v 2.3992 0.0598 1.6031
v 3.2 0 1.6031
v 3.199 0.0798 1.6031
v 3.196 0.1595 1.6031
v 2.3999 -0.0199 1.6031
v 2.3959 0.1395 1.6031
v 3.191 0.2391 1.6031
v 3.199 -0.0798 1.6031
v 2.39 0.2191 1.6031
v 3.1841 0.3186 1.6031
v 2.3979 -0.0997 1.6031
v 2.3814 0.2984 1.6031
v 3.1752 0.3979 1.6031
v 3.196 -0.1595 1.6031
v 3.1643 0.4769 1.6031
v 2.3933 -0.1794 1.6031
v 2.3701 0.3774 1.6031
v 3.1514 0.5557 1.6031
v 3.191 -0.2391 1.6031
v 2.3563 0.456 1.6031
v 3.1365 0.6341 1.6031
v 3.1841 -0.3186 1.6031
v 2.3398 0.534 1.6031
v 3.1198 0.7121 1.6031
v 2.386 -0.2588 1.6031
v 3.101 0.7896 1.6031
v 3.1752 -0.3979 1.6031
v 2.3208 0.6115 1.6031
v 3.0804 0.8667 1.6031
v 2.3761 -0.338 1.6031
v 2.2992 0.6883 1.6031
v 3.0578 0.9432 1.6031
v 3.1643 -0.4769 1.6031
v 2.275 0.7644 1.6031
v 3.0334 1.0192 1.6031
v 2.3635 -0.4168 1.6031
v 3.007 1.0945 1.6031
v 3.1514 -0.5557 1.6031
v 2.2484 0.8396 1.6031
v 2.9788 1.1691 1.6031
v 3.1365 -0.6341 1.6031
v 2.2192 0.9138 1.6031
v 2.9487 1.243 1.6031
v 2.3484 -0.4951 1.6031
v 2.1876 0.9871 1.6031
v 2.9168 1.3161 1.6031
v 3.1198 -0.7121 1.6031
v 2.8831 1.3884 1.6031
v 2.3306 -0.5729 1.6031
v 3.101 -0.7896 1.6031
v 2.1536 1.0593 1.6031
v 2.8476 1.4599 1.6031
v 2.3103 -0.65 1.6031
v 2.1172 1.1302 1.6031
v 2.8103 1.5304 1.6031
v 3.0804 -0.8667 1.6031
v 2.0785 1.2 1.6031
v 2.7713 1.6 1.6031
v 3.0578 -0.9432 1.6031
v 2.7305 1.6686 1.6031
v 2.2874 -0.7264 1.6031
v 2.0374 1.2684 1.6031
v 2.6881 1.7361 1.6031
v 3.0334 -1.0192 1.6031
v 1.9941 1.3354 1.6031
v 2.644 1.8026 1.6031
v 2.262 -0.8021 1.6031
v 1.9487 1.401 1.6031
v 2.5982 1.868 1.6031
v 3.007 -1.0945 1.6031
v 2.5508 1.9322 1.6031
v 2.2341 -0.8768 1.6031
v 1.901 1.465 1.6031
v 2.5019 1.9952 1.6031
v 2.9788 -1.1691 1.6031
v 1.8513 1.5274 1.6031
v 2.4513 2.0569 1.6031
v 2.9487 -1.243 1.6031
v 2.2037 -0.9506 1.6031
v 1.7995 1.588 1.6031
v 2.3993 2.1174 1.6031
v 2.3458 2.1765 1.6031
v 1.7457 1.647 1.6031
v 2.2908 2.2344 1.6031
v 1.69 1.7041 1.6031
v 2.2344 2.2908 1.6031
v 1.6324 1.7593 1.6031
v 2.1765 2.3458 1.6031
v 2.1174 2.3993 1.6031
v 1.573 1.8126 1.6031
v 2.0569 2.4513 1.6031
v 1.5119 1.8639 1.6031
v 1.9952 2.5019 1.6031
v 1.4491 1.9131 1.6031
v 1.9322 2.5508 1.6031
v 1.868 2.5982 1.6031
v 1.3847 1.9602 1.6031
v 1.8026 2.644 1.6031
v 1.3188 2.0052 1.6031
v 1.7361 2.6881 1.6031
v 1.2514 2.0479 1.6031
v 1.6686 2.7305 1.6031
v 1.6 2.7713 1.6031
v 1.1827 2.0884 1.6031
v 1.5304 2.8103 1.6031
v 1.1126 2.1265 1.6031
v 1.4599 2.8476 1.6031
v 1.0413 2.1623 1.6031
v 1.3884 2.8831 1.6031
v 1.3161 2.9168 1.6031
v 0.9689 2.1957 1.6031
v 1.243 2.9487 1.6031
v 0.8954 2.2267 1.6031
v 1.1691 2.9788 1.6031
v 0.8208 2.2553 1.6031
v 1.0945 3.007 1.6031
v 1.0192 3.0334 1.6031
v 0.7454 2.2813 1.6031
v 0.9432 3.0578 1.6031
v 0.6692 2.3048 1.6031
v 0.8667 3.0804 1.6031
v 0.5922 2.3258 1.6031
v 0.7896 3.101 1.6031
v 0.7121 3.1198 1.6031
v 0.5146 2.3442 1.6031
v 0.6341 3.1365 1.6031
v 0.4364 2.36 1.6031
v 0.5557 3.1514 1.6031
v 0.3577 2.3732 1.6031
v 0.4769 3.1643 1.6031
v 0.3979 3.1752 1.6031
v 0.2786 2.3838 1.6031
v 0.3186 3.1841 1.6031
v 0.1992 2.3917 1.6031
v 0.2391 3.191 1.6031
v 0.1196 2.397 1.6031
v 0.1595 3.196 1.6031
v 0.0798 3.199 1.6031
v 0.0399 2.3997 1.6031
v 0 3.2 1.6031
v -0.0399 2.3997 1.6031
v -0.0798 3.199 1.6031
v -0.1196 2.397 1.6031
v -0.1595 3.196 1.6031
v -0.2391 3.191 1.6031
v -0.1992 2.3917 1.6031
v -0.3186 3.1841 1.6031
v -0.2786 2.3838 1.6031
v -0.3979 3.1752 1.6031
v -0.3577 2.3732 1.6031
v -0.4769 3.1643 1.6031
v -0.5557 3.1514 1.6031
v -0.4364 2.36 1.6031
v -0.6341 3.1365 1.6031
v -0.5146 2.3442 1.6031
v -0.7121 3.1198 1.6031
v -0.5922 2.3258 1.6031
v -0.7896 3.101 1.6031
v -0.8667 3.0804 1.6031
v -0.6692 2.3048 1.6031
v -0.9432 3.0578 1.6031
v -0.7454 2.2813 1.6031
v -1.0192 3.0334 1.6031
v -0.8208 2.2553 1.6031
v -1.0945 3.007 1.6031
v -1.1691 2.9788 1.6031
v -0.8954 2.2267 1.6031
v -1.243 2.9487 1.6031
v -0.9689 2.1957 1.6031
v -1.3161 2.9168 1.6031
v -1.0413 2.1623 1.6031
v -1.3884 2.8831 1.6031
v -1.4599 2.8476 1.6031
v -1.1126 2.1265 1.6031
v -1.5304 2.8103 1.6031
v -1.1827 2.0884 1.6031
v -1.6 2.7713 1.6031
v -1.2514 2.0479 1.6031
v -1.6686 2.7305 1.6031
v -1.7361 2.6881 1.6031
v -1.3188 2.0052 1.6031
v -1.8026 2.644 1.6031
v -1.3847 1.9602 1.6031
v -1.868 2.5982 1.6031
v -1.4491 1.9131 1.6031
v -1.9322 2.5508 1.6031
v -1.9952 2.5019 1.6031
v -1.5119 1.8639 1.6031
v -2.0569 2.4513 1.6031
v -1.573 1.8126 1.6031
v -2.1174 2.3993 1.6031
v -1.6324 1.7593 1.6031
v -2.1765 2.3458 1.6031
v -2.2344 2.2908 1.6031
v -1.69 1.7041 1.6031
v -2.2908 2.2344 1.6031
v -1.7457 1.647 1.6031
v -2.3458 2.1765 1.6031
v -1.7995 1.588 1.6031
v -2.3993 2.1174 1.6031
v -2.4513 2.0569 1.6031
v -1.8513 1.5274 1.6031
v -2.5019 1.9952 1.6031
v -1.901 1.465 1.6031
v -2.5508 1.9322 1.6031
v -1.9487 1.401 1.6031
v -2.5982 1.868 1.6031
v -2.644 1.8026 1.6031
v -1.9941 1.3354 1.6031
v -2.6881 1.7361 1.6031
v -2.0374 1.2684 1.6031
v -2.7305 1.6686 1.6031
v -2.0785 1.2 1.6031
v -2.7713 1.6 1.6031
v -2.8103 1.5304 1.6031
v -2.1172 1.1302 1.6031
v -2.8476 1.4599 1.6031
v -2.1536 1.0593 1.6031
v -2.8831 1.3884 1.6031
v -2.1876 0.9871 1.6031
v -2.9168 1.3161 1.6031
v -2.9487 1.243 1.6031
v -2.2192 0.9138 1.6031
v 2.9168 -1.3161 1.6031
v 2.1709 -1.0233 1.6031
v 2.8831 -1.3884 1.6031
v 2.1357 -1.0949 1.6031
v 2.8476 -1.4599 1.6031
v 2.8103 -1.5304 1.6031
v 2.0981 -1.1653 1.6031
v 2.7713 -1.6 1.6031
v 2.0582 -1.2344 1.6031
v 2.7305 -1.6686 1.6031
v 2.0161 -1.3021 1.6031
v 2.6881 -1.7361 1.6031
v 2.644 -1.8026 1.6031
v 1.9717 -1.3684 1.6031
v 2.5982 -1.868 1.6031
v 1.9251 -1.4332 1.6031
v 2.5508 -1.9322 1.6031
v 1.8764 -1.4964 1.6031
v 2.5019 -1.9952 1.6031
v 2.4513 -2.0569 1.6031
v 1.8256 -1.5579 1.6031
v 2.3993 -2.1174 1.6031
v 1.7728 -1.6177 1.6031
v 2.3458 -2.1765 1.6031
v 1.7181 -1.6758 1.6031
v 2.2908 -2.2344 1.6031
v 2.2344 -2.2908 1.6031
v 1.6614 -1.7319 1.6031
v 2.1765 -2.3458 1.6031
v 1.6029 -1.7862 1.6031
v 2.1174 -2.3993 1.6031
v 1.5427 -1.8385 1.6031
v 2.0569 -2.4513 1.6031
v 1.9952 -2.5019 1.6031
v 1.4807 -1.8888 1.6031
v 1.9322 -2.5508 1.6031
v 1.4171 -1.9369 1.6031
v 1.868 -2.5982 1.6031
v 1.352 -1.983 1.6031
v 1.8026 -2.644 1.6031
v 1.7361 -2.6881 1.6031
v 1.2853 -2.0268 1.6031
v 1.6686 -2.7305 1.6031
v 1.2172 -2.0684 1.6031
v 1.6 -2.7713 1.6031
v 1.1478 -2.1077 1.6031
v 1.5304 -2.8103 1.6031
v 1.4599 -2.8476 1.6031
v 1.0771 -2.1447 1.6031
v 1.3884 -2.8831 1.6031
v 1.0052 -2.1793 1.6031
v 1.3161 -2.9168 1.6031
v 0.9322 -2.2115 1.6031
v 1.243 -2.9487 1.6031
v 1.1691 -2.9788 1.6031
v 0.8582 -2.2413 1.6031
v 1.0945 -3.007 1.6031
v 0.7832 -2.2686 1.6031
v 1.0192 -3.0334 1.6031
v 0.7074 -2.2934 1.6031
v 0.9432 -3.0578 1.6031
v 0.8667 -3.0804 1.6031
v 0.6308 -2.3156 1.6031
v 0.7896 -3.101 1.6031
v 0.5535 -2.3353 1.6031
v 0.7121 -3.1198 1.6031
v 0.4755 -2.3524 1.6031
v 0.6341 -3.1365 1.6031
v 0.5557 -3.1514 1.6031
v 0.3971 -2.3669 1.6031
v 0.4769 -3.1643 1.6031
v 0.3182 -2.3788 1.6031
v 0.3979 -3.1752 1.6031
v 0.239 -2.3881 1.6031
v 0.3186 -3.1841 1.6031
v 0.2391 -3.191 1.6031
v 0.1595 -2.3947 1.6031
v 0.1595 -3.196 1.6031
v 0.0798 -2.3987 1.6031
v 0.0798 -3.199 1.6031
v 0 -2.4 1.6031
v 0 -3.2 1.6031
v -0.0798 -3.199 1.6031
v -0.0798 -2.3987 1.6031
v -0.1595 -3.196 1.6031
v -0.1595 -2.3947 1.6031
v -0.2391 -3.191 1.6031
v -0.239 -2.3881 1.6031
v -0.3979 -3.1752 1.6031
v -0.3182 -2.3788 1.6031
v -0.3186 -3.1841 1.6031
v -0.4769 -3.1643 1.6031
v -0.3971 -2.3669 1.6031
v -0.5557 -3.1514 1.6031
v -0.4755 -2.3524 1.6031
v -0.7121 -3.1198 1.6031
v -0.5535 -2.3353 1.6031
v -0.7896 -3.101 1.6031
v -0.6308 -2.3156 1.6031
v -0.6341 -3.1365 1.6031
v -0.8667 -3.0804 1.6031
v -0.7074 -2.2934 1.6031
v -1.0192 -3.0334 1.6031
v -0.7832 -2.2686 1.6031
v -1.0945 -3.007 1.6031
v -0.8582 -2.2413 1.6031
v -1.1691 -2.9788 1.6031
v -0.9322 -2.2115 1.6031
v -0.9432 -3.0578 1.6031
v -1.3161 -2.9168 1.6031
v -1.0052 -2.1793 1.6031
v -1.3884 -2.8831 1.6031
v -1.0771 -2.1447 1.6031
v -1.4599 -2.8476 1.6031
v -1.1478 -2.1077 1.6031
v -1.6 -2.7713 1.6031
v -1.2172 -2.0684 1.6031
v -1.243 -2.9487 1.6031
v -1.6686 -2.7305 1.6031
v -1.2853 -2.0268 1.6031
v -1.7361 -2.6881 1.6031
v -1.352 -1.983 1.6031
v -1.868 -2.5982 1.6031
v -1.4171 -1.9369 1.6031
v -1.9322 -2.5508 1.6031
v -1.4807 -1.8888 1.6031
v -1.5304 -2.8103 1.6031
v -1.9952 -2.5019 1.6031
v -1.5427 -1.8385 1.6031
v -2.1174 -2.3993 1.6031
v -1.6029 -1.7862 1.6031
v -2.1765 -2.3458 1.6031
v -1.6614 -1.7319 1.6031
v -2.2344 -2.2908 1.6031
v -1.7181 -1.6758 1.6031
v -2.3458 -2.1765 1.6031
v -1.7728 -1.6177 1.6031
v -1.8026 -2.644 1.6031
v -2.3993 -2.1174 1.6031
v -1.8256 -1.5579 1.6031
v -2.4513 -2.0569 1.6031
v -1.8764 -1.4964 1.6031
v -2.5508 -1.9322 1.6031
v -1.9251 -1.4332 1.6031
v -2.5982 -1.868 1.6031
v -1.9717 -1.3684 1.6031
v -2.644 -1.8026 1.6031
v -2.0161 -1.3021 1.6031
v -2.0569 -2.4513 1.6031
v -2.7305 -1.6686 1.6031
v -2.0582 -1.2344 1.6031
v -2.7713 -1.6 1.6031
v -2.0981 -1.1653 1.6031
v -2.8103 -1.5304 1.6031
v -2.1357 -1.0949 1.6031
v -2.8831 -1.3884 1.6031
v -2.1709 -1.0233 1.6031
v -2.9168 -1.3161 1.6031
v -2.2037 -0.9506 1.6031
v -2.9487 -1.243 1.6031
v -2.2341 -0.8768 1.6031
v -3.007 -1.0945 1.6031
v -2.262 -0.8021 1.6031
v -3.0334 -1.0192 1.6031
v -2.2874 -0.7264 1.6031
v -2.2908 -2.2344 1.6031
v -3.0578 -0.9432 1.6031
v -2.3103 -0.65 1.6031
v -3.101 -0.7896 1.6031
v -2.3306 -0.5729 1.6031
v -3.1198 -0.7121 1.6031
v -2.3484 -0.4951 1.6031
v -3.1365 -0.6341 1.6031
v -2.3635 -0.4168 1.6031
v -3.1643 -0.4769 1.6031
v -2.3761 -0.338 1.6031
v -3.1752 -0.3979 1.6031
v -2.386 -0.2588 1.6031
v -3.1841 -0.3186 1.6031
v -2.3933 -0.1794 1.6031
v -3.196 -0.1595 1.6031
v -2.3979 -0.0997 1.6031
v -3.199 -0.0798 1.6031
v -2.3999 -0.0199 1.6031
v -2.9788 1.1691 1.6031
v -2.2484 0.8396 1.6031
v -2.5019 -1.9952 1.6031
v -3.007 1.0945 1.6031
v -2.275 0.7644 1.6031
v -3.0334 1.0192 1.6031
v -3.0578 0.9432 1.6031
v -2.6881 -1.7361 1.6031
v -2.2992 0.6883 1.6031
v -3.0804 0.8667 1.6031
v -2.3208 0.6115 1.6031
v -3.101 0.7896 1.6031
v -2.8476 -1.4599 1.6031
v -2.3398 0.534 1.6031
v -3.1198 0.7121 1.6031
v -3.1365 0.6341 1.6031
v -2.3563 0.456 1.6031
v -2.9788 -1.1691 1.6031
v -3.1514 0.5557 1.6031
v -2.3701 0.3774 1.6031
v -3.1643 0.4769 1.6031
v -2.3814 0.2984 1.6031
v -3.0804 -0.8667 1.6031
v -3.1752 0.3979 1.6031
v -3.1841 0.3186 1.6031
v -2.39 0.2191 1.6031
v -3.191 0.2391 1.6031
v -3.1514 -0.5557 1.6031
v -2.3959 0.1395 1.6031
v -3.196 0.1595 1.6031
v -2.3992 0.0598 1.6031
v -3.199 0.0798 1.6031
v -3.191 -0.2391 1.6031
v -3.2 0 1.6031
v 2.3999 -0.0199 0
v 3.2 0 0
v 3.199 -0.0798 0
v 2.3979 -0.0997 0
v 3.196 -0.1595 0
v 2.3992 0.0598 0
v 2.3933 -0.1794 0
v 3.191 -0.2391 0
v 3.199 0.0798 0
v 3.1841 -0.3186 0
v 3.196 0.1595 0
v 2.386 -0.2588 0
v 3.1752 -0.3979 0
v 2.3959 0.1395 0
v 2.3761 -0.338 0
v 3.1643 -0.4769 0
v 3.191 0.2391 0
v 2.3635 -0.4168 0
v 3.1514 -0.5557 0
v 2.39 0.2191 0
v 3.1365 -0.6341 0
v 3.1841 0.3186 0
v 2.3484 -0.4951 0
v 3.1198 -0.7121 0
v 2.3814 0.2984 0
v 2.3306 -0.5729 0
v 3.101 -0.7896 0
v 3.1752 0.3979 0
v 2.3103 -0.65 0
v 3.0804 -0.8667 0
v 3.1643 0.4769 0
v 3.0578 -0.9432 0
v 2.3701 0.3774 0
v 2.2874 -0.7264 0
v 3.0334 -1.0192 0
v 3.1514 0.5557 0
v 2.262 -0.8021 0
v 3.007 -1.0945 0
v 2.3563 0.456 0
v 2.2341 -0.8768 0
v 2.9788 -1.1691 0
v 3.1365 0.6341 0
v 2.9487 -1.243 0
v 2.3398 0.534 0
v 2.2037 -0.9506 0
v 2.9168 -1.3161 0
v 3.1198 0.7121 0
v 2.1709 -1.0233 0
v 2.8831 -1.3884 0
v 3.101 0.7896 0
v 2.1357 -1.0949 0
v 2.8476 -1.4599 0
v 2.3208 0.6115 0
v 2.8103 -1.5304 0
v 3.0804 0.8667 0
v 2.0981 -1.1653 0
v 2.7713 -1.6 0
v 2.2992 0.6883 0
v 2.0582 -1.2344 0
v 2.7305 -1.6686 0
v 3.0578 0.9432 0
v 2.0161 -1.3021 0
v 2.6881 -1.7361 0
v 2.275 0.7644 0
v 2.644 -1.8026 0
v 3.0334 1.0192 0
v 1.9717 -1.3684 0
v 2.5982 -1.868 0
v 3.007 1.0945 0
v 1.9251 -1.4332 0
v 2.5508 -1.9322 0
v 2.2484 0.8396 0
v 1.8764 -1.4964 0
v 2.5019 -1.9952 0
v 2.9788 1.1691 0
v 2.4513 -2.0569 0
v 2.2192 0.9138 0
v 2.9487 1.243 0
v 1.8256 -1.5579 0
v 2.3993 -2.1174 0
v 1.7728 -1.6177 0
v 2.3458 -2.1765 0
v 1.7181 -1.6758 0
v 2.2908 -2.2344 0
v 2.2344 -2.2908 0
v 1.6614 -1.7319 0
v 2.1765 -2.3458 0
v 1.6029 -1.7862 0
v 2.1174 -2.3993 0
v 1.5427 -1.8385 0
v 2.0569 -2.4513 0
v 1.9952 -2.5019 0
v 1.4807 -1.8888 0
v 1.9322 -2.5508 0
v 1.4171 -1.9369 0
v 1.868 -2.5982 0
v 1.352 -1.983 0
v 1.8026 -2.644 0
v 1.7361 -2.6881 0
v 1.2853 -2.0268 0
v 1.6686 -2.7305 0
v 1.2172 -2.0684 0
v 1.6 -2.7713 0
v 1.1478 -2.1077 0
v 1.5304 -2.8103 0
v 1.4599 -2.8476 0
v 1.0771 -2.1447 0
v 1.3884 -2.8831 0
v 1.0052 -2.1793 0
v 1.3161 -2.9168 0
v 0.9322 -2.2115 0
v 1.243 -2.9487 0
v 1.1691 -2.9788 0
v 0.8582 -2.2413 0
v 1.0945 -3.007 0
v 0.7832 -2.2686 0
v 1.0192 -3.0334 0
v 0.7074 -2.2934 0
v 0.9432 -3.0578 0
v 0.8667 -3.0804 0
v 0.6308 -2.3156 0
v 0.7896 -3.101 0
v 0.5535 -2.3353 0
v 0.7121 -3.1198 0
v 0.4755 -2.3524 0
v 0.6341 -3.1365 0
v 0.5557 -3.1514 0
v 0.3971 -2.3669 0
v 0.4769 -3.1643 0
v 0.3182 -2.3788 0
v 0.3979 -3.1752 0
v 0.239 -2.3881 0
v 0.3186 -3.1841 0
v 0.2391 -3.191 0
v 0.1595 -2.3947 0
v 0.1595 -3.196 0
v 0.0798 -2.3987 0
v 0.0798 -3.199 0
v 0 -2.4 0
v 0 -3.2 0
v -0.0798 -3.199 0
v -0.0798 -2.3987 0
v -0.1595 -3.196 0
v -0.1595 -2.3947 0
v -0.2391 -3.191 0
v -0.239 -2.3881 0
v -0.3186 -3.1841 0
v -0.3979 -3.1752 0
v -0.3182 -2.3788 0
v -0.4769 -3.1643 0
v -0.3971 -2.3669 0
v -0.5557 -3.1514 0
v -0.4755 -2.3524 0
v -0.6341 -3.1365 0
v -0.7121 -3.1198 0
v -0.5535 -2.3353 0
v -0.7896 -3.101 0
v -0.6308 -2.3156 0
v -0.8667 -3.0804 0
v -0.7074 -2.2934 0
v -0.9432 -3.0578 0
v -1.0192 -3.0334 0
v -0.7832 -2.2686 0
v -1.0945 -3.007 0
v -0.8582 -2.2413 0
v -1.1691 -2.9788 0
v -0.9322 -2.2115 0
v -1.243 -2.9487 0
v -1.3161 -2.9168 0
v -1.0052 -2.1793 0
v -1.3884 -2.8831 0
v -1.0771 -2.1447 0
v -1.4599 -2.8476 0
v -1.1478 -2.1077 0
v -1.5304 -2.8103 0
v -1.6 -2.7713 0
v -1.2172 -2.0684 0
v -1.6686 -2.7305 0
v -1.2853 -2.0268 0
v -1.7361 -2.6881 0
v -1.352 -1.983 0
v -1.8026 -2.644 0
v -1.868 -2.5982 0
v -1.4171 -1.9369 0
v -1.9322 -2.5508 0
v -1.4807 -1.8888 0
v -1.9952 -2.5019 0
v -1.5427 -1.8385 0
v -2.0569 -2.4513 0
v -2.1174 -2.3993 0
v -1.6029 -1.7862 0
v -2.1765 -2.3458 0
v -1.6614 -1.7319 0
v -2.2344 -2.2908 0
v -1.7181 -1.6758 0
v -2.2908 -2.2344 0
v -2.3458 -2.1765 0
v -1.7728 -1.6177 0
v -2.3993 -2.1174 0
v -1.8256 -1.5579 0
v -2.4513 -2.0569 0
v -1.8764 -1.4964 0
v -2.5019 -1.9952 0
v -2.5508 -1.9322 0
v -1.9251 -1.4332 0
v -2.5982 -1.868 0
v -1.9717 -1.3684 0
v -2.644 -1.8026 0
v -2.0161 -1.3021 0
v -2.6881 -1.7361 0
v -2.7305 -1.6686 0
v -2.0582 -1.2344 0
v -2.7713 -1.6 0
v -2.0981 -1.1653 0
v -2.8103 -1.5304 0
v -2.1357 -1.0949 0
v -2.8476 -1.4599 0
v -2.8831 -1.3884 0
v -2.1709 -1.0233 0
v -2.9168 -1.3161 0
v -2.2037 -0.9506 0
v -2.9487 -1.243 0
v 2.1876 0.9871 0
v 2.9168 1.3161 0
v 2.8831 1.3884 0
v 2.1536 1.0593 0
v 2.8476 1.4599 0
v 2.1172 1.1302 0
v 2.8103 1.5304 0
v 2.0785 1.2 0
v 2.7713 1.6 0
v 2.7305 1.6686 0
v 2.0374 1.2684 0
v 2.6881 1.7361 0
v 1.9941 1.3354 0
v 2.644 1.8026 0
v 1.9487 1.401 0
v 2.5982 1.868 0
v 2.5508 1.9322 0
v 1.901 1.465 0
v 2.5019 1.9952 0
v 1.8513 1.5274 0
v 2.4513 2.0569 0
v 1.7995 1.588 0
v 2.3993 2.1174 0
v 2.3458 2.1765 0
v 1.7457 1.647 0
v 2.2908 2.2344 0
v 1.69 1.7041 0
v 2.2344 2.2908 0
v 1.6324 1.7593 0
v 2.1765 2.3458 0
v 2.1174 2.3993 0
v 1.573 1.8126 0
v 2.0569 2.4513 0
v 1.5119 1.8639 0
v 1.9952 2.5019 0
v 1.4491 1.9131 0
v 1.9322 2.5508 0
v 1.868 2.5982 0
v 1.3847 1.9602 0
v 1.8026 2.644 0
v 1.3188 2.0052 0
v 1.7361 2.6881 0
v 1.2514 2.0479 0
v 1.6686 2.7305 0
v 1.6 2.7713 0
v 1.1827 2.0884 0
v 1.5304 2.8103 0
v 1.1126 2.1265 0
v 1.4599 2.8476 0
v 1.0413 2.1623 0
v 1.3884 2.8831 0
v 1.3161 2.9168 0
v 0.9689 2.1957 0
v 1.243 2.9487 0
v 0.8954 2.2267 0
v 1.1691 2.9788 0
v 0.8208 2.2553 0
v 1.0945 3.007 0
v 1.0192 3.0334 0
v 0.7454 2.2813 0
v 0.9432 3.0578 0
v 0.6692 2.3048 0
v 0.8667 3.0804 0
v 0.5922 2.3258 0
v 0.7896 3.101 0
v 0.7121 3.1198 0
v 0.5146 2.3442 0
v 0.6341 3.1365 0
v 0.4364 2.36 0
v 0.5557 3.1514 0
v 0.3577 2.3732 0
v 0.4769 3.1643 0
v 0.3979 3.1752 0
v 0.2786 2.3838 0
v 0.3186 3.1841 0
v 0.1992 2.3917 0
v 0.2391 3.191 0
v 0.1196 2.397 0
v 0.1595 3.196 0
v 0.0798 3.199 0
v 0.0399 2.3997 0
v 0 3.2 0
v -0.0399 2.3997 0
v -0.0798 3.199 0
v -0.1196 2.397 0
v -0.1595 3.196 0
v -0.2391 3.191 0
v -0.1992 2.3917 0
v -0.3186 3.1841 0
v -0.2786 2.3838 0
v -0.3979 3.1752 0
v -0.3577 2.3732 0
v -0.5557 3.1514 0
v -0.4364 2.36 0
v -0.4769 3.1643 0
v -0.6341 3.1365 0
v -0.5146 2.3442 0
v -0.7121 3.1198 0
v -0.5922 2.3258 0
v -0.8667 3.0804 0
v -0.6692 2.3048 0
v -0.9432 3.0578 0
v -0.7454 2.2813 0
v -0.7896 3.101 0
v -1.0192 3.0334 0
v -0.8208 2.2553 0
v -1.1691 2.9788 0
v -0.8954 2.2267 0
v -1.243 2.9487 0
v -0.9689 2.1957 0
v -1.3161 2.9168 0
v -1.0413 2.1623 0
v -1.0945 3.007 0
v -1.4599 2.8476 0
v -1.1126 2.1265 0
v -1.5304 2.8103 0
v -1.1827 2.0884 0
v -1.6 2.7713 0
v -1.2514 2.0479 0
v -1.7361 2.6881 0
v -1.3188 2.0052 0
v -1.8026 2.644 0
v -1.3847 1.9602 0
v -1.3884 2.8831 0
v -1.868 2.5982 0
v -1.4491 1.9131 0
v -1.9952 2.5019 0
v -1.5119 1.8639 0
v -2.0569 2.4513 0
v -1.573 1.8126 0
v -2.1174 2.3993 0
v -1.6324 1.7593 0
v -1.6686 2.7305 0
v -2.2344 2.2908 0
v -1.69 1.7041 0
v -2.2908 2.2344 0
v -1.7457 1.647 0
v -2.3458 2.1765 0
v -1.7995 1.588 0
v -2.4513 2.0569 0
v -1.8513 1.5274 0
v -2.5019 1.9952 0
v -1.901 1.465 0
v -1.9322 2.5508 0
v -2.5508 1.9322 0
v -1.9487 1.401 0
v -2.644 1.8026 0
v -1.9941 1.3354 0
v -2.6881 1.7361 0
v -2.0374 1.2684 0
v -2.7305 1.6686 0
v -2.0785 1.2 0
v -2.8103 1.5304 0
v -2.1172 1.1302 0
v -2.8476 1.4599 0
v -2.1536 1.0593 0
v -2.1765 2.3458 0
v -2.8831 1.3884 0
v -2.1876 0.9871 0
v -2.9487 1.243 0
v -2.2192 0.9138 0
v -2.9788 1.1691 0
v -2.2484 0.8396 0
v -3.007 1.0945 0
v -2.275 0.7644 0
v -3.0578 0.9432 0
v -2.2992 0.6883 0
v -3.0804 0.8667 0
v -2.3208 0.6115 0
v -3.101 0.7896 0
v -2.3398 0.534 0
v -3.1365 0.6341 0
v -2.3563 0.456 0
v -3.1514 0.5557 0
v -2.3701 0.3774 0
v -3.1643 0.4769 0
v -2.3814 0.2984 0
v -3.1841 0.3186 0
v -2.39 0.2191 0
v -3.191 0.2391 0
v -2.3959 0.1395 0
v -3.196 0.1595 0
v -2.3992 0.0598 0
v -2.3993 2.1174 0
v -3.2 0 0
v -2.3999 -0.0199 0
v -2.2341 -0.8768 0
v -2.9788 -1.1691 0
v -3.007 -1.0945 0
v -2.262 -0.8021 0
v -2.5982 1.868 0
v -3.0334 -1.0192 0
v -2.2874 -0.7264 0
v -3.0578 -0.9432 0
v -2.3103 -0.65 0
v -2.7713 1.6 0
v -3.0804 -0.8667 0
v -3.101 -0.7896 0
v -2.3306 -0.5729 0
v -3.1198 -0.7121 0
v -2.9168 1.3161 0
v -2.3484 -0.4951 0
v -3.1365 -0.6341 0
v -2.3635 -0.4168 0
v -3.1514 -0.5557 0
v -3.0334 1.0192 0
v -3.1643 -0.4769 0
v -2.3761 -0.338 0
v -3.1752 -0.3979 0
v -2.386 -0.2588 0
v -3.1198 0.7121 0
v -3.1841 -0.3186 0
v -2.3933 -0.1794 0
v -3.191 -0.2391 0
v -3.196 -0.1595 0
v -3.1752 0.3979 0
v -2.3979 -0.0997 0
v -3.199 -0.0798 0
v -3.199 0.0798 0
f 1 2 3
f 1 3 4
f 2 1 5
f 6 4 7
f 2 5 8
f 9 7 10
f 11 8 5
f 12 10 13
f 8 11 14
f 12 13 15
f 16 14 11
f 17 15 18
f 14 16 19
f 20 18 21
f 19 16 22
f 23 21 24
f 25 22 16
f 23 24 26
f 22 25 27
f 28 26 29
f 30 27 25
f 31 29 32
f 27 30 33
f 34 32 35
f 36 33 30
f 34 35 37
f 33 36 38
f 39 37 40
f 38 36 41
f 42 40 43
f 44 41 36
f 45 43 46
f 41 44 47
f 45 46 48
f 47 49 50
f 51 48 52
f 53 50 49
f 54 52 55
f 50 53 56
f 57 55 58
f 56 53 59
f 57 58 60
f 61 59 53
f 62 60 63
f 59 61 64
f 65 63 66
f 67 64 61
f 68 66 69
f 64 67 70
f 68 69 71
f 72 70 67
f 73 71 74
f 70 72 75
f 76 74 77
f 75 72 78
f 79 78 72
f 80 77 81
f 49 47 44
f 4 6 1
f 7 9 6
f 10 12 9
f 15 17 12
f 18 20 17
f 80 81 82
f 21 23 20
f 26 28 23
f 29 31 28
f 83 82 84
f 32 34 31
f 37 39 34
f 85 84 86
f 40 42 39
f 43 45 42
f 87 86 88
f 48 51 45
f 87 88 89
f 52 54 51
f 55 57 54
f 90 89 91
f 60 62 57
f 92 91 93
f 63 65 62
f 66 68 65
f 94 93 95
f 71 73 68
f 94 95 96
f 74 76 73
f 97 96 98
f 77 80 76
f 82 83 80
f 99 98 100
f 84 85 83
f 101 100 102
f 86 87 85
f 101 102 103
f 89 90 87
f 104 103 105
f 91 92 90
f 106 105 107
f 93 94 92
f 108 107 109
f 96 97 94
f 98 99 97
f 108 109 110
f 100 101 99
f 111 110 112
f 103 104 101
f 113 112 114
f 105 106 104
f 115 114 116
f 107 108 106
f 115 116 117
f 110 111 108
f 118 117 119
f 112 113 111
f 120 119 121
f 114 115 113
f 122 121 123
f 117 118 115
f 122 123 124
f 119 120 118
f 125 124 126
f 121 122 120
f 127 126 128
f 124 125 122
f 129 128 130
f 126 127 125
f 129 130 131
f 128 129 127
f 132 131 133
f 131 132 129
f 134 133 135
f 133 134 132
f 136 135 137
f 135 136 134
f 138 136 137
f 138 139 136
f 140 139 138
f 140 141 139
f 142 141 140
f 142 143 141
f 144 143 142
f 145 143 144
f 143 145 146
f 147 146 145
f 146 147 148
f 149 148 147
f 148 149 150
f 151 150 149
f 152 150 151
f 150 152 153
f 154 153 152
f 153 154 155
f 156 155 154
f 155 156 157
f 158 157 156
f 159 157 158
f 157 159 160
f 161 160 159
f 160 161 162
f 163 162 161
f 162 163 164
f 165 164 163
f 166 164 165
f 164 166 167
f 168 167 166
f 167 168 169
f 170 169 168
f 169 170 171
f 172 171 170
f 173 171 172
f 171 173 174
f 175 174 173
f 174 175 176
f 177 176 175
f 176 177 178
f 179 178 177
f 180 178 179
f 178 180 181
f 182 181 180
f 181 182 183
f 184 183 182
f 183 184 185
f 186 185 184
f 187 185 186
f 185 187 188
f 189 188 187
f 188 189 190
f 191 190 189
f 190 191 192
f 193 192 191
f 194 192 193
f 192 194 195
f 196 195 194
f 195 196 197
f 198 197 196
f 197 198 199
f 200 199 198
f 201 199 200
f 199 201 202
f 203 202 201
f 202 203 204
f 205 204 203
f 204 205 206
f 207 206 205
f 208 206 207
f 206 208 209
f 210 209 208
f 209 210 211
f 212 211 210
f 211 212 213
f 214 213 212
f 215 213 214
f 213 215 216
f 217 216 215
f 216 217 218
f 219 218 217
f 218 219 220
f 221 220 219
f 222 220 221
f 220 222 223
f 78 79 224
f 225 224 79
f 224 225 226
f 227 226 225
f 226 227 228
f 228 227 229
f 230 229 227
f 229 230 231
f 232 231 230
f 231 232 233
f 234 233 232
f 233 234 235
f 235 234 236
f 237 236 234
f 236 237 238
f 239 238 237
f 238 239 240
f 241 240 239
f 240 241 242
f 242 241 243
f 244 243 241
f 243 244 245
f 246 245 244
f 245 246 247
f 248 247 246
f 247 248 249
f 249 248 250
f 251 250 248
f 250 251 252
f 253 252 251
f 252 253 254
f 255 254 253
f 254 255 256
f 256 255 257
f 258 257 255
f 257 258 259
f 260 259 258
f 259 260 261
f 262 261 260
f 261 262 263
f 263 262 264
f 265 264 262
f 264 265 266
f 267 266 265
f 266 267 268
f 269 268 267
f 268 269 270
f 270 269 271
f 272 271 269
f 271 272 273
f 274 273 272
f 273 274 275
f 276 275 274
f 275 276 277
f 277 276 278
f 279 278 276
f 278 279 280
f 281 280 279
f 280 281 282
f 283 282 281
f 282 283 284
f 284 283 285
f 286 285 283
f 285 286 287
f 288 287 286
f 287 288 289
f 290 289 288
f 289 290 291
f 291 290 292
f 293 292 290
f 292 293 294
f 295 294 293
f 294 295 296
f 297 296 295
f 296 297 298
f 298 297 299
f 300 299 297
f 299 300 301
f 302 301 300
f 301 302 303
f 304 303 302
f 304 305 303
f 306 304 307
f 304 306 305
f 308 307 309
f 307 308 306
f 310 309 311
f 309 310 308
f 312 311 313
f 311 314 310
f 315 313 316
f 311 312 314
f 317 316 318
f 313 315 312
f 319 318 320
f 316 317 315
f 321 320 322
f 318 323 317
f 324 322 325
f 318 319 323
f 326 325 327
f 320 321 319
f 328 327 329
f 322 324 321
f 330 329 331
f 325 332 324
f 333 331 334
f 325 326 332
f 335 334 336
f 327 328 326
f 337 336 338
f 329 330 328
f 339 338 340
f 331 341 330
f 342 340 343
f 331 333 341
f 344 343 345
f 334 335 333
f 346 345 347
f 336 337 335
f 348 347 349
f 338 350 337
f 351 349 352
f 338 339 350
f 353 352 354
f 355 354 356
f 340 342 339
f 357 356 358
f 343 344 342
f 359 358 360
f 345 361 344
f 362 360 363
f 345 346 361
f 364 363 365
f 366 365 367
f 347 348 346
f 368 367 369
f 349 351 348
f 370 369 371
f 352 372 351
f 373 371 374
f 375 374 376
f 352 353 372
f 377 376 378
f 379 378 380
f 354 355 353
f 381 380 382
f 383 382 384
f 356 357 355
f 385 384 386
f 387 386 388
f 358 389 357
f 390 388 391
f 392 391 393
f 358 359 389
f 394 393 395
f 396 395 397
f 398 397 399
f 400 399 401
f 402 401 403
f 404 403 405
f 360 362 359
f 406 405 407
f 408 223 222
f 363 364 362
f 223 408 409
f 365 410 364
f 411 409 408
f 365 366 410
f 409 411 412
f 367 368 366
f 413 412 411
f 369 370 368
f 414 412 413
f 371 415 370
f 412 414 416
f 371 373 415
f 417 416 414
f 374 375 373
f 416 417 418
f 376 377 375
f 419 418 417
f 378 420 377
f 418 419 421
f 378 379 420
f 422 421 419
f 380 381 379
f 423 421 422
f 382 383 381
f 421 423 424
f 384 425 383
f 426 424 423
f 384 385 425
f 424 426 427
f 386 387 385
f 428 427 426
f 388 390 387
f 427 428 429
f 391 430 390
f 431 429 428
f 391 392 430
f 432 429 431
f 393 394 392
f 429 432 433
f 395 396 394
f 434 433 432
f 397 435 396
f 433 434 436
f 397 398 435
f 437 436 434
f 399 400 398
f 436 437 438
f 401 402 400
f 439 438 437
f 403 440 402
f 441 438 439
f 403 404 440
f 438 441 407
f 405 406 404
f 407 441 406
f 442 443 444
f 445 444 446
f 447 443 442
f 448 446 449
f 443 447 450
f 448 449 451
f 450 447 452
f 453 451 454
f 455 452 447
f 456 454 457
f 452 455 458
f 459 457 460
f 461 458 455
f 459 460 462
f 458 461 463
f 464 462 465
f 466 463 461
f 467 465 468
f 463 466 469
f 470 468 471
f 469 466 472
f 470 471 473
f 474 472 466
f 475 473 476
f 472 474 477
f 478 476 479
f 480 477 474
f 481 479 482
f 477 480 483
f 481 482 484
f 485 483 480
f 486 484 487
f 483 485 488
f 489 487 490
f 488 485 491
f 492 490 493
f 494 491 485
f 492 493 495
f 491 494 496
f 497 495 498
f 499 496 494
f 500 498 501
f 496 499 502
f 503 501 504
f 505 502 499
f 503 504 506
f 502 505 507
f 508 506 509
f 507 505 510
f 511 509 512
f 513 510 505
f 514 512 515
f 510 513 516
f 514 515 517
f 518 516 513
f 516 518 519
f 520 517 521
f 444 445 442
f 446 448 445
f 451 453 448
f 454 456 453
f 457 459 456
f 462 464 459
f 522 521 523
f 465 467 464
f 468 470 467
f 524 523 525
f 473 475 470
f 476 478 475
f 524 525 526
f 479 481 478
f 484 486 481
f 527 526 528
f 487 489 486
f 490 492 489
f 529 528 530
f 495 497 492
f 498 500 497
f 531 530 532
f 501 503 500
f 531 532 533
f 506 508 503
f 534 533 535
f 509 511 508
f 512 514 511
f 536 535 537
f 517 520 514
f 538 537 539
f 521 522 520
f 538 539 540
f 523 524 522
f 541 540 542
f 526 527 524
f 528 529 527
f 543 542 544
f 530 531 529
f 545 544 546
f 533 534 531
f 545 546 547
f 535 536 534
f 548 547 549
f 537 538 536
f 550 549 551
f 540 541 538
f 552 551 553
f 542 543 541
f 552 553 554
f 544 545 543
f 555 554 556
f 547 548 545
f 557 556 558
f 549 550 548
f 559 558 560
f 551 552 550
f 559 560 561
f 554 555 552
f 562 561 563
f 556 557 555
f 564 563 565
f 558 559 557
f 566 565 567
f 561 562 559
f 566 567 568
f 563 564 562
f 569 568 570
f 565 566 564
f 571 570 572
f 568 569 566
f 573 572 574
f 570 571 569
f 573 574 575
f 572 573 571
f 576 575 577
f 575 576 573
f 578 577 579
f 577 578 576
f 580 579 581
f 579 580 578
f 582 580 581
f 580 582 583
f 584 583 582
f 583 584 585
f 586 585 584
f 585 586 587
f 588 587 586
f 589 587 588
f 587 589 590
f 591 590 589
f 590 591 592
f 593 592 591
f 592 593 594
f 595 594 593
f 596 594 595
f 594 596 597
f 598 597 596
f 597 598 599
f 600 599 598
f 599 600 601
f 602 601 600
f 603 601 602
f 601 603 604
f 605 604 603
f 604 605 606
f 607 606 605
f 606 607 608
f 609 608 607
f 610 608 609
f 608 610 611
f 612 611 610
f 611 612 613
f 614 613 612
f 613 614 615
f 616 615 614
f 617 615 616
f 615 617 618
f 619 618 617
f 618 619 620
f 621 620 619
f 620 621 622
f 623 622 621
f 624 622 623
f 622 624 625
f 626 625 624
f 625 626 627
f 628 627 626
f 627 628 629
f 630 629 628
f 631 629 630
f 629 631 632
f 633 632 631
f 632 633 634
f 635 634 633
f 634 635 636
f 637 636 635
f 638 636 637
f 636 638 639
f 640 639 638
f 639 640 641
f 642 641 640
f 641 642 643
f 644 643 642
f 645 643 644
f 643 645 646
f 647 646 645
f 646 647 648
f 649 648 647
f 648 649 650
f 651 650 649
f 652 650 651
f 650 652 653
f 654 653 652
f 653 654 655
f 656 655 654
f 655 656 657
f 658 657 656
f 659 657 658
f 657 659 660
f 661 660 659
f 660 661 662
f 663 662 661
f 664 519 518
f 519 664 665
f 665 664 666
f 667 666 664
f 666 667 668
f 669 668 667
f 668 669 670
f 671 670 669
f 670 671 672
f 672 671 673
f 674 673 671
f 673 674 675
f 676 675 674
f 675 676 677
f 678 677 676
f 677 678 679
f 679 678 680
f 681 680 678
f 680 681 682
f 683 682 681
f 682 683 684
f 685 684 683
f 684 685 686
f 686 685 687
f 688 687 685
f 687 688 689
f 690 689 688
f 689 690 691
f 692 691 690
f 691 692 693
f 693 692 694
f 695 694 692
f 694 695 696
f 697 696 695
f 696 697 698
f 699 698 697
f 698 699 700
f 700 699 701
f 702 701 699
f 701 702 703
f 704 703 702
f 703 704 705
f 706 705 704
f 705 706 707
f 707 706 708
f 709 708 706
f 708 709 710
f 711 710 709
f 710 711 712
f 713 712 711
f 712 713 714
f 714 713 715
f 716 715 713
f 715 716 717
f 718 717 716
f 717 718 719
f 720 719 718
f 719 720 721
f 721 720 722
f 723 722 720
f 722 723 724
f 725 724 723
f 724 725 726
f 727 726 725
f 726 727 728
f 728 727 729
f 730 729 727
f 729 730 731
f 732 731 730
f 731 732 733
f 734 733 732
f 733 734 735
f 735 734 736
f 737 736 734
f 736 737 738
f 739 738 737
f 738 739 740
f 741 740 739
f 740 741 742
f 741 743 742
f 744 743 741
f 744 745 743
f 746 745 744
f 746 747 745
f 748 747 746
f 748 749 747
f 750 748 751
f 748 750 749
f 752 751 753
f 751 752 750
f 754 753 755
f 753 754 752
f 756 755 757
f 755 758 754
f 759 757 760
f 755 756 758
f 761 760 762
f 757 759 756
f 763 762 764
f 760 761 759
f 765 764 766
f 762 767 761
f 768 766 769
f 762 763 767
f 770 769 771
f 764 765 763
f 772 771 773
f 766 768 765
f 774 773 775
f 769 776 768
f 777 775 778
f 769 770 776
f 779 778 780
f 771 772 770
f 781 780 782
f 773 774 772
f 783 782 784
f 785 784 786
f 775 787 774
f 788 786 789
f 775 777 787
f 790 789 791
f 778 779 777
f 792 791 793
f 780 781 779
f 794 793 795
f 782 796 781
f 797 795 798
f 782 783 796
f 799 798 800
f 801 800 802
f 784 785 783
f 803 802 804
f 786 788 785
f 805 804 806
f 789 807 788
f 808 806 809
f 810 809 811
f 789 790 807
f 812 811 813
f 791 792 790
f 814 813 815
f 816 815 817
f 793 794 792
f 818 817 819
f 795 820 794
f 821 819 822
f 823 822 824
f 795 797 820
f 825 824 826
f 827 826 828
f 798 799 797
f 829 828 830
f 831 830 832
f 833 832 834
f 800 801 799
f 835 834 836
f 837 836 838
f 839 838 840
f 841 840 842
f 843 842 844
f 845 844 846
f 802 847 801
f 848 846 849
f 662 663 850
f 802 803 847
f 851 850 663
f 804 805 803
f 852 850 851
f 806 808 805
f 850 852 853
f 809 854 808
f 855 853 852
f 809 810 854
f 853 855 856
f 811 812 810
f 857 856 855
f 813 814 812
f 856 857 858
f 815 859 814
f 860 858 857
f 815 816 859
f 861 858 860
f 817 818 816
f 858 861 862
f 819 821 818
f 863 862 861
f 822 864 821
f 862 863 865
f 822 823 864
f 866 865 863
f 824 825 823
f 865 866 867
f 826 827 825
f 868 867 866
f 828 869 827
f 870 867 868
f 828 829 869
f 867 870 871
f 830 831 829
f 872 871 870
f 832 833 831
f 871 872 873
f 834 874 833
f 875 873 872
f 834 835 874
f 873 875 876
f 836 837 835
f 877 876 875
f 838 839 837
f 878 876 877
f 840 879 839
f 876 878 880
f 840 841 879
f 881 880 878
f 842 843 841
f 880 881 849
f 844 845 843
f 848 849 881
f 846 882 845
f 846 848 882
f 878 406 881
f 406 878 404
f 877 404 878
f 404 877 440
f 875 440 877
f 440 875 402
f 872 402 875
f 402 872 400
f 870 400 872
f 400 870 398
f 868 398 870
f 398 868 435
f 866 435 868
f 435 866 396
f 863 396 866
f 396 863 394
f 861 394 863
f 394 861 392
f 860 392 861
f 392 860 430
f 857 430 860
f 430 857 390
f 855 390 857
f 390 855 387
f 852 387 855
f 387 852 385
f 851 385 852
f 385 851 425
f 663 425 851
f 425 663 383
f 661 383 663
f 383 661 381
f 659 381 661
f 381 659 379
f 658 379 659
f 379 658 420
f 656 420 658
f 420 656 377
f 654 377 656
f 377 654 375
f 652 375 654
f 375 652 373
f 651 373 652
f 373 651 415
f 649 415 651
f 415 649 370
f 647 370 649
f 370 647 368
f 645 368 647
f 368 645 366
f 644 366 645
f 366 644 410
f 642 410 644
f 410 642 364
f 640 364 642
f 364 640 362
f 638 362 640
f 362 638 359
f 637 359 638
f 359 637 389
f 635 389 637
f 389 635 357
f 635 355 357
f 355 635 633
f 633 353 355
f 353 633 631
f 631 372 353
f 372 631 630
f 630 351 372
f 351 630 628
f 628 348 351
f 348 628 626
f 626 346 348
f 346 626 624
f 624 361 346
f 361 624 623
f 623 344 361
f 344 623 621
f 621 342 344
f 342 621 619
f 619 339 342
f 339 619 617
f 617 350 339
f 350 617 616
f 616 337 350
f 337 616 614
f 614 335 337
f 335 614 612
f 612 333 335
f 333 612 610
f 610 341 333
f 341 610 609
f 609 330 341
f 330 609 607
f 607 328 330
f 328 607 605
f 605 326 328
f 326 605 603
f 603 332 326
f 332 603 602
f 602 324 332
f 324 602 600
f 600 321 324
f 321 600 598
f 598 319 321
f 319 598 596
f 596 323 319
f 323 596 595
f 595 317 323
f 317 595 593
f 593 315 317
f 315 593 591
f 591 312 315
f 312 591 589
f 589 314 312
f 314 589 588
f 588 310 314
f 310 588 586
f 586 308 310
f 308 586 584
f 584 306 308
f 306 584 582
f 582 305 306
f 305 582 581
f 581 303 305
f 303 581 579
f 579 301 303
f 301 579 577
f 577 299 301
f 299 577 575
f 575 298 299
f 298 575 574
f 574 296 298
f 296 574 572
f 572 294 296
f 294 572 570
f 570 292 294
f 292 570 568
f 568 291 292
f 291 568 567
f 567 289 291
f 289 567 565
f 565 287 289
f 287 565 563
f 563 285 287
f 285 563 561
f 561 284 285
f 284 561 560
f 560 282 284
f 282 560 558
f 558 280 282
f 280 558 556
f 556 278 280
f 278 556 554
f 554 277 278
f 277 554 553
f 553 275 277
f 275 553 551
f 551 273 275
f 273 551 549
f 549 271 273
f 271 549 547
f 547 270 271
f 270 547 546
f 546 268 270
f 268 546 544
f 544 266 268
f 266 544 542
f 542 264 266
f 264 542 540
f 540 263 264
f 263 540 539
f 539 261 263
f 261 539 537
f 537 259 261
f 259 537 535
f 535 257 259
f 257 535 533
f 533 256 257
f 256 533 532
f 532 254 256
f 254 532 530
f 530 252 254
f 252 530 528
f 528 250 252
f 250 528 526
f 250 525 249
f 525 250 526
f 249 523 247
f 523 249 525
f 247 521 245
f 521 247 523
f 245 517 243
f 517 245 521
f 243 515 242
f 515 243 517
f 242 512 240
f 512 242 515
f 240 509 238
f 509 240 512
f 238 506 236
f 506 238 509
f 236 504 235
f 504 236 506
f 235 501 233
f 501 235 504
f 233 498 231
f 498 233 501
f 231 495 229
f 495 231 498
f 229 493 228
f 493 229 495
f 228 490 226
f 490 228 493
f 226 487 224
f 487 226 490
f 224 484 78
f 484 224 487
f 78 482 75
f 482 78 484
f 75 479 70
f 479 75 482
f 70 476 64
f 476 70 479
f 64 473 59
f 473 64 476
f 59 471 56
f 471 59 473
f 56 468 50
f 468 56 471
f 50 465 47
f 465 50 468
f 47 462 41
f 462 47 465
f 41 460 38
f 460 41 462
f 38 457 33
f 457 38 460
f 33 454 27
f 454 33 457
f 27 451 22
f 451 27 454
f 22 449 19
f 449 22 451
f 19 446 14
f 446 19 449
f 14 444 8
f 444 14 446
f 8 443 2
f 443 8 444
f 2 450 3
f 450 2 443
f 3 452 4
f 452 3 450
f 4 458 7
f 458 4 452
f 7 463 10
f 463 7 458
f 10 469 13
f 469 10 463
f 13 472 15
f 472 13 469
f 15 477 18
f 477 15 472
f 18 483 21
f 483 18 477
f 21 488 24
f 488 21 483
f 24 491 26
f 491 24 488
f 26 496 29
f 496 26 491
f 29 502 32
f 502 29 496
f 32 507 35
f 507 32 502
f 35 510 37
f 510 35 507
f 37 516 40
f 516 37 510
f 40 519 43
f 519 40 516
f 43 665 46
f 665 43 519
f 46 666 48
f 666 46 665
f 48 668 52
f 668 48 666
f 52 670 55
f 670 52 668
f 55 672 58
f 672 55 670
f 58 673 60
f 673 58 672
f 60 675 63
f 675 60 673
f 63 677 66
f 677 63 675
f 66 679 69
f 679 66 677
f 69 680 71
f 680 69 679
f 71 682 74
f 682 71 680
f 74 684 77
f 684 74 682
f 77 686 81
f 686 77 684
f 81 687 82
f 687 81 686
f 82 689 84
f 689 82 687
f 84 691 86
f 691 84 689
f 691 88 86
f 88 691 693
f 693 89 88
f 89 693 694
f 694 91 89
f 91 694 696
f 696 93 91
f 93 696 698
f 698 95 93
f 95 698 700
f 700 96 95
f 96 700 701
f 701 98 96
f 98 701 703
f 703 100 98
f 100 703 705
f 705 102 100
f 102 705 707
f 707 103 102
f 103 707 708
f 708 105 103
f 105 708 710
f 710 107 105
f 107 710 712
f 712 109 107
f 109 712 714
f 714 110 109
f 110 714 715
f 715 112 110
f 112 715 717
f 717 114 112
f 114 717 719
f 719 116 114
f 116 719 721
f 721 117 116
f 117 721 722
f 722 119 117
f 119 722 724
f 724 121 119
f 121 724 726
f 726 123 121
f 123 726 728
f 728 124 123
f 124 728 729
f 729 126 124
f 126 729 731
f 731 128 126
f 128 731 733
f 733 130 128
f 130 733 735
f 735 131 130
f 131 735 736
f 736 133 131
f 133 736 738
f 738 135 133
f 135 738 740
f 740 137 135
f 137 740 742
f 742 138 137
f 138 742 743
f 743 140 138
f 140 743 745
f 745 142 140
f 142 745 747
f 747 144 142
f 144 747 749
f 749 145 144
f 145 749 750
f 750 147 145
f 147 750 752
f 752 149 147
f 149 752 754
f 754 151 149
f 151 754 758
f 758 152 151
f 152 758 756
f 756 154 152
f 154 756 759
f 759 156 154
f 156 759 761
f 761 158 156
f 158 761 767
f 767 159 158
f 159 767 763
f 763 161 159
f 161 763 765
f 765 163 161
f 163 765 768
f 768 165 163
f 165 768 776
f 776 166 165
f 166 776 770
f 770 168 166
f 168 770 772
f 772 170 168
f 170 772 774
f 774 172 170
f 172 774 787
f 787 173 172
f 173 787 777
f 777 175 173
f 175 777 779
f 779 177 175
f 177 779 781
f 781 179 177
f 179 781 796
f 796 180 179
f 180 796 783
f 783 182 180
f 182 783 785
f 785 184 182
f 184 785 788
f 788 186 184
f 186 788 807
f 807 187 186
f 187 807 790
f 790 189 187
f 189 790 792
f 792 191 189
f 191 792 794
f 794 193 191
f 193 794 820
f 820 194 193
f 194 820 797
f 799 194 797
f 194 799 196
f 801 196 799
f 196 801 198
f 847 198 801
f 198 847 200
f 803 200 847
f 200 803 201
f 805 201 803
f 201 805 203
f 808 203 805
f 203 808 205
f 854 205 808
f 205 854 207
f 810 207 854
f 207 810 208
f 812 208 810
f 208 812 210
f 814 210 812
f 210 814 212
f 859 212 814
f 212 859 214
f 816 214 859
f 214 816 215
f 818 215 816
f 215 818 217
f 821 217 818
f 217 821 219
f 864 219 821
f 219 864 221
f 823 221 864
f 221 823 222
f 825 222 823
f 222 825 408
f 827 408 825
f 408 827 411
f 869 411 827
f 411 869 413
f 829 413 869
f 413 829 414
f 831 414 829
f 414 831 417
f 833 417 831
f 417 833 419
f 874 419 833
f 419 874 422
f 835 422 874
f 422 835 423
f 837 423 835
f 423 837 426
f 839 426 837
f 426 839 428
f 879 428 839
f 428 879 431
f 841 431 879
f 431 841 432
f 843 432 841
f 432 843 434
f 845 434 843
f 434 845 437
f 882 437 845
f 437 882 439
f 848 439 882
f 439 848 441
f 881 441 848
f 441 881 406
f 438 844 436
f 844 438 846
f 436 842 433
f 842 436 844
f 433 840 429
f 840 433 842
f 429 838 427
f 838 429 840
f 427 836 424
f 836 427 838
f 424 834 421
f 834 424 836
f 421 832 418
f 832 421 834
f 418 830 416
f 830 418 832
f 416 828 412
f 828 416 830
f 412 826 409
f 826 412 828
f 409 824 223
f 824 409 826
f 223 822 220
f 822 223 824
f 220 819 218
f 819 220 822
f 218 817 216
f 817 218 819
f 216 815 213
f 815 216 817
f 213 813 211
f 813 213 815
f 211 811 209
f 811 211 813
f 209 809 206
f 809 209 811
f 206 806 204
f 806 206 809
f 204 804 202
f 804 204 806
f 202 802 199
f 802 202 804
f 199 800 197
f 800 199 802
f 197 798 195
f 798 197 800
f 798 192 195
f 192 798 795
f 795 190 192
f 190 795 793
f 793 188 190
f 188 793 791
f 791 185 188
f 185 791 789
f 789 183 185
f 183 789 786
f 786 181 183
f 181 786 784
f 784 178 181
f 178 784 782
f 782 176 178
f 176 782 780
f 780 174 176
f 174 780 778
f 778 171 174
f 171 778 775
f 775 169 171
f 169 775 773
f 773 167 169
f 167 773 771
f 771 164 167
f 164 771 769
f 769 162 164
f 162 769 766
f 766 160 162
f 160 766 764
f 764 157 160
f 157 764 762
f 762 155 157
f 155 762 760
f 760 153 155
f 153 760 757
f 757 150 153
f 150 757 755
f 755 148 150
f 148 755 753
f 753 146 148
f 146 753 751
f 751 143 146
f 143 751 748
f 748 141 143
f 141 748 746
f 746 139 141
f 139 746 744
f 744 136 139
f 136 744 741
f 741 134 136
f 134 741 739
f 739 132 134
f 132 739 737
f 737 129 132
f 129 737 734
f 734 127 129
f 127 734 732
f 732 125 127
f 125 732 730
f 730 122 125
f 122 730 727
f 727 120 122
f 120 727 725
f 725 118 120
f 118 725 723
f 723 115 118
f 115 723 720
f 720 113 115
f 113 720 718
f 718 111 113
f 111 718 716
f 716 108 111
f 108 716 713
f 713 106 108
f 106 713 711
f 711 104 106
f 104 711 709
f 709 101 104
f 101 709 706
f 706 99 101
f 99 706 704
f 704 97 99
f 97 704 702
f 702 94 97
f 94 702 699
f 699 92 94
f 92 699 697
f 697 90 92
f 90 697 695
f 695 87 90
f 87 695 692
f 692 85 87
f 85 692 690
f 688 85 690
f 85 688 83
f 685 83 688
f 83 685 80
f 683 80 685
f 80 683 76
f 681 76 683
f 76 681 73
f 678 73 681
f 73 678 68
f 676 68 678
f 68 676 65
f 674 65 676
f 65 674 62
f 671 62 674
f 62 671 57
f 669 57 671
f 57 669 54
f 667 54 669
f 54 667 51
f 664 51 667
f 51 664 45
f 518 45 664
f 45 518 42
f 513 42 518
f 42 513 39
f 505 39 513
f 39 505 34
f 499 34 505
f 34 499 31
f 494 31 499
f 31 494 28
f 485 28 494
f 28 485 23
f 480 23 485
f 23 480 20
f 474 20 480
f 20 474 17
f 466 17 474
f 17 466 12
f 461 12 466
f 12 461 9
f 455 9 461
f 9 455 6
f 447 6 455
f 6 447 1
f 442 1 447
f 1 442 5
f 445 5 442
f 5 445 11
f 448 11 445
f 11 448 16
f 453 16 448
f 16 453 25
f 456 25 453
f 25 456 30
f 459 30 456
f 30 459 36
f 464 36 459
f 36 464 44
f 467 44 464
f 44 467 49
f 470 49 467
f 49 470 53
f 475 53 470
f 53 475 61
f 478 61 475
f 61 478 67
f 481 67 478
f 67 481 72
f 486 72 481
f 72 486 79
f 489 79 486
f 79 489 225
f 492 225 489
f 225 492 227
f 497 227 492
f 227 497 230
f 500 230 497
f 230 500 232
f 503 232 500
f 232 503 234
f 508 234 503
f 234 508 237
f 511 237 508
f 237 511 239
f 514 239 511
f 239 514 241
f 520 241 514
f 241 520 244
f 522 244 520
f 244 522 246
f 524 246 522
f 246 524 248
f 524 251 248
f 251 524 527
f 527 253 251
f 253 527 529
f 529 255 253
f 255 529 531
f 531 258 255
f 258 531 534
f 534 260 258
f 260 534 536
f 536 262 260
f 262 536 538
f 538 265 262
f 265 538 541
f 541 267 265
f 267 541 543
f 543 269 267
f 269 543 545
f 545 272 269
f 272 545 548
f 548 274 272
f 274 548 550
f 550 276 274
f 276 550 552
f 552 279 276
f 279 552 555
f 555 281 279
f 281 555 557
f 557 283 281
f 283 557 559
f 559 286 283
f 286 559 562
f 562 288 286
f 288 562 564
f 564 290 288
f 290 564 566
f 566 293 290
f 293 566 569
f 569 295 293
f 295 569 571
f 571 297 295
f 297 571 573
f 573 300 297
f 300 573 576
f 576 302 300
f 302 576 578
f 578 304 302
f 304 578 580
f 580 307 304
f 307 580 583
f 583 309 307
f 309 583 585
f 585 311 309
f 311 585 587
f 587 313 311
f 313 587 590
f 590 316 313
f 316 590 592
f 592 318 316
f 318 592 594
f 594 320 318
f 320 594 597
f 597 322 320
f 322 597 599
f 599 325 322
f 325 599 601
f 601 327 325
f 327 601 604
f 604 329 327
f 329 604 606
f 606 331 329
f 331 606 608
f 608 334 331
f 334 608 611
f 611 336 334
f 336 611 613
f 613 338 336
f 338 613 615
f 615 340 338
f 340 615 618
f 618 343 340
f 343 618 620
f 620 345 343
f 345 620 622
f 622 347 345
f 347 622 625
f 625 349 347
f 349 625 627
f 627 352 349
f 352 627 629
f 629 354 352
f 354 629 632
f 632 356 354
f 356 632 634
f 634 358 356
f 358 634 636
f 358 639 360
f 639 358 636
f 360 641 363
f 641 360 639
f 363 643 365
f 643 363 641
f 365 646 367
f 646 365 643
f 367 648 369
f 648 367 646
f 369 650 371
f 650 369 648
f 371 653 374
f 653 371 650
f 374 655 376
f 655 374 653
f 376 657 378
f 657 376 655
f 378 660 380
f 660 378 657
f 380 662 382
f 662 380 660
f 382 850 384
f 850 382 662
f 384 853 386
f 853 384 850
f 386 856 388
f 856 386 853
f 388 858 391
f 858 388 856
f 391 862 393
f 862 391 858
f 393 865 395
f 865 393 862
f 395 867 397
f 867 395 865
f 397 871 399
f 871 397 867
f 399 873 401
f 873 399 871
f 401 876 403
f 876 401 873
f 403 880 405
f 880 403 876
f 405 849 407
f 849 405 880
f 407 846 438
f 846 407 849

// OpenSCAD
use <../lib.scad>
use <6094.scad>
use <6095.scad>
use <70926.scad>
use <u9349.scad>
$fa=1; $fs=0.2;
function ldraw_lib__74948(realsolid=false) = [
// 0 Minifig Compass
// 0 Name: 74948.dat
// 0 Author: Michael Heidemann [mikeheide]
// 0 !LDRAW_ORG Shortcut UPDATE 2020-01
// 0 !LICENSE Licensed under CC BY 2.0 and CC BY 4.0 : see CAreadme.txt
// 
// 0 BFC CERTIFY CCW
  [0,"BFC","CERTIFY"],
  [0,"BFC","CCW"],
// 
// 0 !CATEGORY Minifig Accessory
// 
// 0 !HISTORY 2010-07-05 [PTadmin] Official Update 2010-02
// 0 !HISTORY 2013-04-23 [MagFors] Changed colour 383 to 494 (real metal)
// 0 !HISTORY 2018-06-02 [MagFors] Renamed from 889c01
// 0 !HISTORY 2020-06-28 [PTadmin] Official Update 2020-01
// 
// 
// 1 47 0 0 0 1 0 0 0 1 0 0 0 1 6095.dat
  [1,47,0,0,0,1,0,0,0,1,0,0,0,1, ldraw_lib__6095(realsolid)],
// 1 494 0 0 0 1 0 0 0 1 0 0 0 1 70926.dat
  [1,494,0,0,0,1,0,0,0,1,0,0,0,1, ldraw_lib__70926(realsolid)],
// 1 16 0 0 0 1 0 0 0 1 0 0 0 1 6094.dat
  [1,16,0,0,0,1,0,0,0,1,0,0,0,1, ldraw_lib__6094(realsolid)],
// 1 15 0 0 0 1 0 0 0 1 0 0 0 1 u9349.dat
  [1,15,0,0,0,1,0,0,0,1,0,0,0,1, ldraw_lib__u9349(realsolid)],
];
module ldraw_lib__74948(step=0, col=false, unit=2/5, alt=false, line=0.2, solid=!$preview)
    makepoly(ldraw_lib__74948(solid), step=step, col=col, unit=unit, alt=alt, line=line, solid=solid);
ldraw_lib__74948(line=0.2);
